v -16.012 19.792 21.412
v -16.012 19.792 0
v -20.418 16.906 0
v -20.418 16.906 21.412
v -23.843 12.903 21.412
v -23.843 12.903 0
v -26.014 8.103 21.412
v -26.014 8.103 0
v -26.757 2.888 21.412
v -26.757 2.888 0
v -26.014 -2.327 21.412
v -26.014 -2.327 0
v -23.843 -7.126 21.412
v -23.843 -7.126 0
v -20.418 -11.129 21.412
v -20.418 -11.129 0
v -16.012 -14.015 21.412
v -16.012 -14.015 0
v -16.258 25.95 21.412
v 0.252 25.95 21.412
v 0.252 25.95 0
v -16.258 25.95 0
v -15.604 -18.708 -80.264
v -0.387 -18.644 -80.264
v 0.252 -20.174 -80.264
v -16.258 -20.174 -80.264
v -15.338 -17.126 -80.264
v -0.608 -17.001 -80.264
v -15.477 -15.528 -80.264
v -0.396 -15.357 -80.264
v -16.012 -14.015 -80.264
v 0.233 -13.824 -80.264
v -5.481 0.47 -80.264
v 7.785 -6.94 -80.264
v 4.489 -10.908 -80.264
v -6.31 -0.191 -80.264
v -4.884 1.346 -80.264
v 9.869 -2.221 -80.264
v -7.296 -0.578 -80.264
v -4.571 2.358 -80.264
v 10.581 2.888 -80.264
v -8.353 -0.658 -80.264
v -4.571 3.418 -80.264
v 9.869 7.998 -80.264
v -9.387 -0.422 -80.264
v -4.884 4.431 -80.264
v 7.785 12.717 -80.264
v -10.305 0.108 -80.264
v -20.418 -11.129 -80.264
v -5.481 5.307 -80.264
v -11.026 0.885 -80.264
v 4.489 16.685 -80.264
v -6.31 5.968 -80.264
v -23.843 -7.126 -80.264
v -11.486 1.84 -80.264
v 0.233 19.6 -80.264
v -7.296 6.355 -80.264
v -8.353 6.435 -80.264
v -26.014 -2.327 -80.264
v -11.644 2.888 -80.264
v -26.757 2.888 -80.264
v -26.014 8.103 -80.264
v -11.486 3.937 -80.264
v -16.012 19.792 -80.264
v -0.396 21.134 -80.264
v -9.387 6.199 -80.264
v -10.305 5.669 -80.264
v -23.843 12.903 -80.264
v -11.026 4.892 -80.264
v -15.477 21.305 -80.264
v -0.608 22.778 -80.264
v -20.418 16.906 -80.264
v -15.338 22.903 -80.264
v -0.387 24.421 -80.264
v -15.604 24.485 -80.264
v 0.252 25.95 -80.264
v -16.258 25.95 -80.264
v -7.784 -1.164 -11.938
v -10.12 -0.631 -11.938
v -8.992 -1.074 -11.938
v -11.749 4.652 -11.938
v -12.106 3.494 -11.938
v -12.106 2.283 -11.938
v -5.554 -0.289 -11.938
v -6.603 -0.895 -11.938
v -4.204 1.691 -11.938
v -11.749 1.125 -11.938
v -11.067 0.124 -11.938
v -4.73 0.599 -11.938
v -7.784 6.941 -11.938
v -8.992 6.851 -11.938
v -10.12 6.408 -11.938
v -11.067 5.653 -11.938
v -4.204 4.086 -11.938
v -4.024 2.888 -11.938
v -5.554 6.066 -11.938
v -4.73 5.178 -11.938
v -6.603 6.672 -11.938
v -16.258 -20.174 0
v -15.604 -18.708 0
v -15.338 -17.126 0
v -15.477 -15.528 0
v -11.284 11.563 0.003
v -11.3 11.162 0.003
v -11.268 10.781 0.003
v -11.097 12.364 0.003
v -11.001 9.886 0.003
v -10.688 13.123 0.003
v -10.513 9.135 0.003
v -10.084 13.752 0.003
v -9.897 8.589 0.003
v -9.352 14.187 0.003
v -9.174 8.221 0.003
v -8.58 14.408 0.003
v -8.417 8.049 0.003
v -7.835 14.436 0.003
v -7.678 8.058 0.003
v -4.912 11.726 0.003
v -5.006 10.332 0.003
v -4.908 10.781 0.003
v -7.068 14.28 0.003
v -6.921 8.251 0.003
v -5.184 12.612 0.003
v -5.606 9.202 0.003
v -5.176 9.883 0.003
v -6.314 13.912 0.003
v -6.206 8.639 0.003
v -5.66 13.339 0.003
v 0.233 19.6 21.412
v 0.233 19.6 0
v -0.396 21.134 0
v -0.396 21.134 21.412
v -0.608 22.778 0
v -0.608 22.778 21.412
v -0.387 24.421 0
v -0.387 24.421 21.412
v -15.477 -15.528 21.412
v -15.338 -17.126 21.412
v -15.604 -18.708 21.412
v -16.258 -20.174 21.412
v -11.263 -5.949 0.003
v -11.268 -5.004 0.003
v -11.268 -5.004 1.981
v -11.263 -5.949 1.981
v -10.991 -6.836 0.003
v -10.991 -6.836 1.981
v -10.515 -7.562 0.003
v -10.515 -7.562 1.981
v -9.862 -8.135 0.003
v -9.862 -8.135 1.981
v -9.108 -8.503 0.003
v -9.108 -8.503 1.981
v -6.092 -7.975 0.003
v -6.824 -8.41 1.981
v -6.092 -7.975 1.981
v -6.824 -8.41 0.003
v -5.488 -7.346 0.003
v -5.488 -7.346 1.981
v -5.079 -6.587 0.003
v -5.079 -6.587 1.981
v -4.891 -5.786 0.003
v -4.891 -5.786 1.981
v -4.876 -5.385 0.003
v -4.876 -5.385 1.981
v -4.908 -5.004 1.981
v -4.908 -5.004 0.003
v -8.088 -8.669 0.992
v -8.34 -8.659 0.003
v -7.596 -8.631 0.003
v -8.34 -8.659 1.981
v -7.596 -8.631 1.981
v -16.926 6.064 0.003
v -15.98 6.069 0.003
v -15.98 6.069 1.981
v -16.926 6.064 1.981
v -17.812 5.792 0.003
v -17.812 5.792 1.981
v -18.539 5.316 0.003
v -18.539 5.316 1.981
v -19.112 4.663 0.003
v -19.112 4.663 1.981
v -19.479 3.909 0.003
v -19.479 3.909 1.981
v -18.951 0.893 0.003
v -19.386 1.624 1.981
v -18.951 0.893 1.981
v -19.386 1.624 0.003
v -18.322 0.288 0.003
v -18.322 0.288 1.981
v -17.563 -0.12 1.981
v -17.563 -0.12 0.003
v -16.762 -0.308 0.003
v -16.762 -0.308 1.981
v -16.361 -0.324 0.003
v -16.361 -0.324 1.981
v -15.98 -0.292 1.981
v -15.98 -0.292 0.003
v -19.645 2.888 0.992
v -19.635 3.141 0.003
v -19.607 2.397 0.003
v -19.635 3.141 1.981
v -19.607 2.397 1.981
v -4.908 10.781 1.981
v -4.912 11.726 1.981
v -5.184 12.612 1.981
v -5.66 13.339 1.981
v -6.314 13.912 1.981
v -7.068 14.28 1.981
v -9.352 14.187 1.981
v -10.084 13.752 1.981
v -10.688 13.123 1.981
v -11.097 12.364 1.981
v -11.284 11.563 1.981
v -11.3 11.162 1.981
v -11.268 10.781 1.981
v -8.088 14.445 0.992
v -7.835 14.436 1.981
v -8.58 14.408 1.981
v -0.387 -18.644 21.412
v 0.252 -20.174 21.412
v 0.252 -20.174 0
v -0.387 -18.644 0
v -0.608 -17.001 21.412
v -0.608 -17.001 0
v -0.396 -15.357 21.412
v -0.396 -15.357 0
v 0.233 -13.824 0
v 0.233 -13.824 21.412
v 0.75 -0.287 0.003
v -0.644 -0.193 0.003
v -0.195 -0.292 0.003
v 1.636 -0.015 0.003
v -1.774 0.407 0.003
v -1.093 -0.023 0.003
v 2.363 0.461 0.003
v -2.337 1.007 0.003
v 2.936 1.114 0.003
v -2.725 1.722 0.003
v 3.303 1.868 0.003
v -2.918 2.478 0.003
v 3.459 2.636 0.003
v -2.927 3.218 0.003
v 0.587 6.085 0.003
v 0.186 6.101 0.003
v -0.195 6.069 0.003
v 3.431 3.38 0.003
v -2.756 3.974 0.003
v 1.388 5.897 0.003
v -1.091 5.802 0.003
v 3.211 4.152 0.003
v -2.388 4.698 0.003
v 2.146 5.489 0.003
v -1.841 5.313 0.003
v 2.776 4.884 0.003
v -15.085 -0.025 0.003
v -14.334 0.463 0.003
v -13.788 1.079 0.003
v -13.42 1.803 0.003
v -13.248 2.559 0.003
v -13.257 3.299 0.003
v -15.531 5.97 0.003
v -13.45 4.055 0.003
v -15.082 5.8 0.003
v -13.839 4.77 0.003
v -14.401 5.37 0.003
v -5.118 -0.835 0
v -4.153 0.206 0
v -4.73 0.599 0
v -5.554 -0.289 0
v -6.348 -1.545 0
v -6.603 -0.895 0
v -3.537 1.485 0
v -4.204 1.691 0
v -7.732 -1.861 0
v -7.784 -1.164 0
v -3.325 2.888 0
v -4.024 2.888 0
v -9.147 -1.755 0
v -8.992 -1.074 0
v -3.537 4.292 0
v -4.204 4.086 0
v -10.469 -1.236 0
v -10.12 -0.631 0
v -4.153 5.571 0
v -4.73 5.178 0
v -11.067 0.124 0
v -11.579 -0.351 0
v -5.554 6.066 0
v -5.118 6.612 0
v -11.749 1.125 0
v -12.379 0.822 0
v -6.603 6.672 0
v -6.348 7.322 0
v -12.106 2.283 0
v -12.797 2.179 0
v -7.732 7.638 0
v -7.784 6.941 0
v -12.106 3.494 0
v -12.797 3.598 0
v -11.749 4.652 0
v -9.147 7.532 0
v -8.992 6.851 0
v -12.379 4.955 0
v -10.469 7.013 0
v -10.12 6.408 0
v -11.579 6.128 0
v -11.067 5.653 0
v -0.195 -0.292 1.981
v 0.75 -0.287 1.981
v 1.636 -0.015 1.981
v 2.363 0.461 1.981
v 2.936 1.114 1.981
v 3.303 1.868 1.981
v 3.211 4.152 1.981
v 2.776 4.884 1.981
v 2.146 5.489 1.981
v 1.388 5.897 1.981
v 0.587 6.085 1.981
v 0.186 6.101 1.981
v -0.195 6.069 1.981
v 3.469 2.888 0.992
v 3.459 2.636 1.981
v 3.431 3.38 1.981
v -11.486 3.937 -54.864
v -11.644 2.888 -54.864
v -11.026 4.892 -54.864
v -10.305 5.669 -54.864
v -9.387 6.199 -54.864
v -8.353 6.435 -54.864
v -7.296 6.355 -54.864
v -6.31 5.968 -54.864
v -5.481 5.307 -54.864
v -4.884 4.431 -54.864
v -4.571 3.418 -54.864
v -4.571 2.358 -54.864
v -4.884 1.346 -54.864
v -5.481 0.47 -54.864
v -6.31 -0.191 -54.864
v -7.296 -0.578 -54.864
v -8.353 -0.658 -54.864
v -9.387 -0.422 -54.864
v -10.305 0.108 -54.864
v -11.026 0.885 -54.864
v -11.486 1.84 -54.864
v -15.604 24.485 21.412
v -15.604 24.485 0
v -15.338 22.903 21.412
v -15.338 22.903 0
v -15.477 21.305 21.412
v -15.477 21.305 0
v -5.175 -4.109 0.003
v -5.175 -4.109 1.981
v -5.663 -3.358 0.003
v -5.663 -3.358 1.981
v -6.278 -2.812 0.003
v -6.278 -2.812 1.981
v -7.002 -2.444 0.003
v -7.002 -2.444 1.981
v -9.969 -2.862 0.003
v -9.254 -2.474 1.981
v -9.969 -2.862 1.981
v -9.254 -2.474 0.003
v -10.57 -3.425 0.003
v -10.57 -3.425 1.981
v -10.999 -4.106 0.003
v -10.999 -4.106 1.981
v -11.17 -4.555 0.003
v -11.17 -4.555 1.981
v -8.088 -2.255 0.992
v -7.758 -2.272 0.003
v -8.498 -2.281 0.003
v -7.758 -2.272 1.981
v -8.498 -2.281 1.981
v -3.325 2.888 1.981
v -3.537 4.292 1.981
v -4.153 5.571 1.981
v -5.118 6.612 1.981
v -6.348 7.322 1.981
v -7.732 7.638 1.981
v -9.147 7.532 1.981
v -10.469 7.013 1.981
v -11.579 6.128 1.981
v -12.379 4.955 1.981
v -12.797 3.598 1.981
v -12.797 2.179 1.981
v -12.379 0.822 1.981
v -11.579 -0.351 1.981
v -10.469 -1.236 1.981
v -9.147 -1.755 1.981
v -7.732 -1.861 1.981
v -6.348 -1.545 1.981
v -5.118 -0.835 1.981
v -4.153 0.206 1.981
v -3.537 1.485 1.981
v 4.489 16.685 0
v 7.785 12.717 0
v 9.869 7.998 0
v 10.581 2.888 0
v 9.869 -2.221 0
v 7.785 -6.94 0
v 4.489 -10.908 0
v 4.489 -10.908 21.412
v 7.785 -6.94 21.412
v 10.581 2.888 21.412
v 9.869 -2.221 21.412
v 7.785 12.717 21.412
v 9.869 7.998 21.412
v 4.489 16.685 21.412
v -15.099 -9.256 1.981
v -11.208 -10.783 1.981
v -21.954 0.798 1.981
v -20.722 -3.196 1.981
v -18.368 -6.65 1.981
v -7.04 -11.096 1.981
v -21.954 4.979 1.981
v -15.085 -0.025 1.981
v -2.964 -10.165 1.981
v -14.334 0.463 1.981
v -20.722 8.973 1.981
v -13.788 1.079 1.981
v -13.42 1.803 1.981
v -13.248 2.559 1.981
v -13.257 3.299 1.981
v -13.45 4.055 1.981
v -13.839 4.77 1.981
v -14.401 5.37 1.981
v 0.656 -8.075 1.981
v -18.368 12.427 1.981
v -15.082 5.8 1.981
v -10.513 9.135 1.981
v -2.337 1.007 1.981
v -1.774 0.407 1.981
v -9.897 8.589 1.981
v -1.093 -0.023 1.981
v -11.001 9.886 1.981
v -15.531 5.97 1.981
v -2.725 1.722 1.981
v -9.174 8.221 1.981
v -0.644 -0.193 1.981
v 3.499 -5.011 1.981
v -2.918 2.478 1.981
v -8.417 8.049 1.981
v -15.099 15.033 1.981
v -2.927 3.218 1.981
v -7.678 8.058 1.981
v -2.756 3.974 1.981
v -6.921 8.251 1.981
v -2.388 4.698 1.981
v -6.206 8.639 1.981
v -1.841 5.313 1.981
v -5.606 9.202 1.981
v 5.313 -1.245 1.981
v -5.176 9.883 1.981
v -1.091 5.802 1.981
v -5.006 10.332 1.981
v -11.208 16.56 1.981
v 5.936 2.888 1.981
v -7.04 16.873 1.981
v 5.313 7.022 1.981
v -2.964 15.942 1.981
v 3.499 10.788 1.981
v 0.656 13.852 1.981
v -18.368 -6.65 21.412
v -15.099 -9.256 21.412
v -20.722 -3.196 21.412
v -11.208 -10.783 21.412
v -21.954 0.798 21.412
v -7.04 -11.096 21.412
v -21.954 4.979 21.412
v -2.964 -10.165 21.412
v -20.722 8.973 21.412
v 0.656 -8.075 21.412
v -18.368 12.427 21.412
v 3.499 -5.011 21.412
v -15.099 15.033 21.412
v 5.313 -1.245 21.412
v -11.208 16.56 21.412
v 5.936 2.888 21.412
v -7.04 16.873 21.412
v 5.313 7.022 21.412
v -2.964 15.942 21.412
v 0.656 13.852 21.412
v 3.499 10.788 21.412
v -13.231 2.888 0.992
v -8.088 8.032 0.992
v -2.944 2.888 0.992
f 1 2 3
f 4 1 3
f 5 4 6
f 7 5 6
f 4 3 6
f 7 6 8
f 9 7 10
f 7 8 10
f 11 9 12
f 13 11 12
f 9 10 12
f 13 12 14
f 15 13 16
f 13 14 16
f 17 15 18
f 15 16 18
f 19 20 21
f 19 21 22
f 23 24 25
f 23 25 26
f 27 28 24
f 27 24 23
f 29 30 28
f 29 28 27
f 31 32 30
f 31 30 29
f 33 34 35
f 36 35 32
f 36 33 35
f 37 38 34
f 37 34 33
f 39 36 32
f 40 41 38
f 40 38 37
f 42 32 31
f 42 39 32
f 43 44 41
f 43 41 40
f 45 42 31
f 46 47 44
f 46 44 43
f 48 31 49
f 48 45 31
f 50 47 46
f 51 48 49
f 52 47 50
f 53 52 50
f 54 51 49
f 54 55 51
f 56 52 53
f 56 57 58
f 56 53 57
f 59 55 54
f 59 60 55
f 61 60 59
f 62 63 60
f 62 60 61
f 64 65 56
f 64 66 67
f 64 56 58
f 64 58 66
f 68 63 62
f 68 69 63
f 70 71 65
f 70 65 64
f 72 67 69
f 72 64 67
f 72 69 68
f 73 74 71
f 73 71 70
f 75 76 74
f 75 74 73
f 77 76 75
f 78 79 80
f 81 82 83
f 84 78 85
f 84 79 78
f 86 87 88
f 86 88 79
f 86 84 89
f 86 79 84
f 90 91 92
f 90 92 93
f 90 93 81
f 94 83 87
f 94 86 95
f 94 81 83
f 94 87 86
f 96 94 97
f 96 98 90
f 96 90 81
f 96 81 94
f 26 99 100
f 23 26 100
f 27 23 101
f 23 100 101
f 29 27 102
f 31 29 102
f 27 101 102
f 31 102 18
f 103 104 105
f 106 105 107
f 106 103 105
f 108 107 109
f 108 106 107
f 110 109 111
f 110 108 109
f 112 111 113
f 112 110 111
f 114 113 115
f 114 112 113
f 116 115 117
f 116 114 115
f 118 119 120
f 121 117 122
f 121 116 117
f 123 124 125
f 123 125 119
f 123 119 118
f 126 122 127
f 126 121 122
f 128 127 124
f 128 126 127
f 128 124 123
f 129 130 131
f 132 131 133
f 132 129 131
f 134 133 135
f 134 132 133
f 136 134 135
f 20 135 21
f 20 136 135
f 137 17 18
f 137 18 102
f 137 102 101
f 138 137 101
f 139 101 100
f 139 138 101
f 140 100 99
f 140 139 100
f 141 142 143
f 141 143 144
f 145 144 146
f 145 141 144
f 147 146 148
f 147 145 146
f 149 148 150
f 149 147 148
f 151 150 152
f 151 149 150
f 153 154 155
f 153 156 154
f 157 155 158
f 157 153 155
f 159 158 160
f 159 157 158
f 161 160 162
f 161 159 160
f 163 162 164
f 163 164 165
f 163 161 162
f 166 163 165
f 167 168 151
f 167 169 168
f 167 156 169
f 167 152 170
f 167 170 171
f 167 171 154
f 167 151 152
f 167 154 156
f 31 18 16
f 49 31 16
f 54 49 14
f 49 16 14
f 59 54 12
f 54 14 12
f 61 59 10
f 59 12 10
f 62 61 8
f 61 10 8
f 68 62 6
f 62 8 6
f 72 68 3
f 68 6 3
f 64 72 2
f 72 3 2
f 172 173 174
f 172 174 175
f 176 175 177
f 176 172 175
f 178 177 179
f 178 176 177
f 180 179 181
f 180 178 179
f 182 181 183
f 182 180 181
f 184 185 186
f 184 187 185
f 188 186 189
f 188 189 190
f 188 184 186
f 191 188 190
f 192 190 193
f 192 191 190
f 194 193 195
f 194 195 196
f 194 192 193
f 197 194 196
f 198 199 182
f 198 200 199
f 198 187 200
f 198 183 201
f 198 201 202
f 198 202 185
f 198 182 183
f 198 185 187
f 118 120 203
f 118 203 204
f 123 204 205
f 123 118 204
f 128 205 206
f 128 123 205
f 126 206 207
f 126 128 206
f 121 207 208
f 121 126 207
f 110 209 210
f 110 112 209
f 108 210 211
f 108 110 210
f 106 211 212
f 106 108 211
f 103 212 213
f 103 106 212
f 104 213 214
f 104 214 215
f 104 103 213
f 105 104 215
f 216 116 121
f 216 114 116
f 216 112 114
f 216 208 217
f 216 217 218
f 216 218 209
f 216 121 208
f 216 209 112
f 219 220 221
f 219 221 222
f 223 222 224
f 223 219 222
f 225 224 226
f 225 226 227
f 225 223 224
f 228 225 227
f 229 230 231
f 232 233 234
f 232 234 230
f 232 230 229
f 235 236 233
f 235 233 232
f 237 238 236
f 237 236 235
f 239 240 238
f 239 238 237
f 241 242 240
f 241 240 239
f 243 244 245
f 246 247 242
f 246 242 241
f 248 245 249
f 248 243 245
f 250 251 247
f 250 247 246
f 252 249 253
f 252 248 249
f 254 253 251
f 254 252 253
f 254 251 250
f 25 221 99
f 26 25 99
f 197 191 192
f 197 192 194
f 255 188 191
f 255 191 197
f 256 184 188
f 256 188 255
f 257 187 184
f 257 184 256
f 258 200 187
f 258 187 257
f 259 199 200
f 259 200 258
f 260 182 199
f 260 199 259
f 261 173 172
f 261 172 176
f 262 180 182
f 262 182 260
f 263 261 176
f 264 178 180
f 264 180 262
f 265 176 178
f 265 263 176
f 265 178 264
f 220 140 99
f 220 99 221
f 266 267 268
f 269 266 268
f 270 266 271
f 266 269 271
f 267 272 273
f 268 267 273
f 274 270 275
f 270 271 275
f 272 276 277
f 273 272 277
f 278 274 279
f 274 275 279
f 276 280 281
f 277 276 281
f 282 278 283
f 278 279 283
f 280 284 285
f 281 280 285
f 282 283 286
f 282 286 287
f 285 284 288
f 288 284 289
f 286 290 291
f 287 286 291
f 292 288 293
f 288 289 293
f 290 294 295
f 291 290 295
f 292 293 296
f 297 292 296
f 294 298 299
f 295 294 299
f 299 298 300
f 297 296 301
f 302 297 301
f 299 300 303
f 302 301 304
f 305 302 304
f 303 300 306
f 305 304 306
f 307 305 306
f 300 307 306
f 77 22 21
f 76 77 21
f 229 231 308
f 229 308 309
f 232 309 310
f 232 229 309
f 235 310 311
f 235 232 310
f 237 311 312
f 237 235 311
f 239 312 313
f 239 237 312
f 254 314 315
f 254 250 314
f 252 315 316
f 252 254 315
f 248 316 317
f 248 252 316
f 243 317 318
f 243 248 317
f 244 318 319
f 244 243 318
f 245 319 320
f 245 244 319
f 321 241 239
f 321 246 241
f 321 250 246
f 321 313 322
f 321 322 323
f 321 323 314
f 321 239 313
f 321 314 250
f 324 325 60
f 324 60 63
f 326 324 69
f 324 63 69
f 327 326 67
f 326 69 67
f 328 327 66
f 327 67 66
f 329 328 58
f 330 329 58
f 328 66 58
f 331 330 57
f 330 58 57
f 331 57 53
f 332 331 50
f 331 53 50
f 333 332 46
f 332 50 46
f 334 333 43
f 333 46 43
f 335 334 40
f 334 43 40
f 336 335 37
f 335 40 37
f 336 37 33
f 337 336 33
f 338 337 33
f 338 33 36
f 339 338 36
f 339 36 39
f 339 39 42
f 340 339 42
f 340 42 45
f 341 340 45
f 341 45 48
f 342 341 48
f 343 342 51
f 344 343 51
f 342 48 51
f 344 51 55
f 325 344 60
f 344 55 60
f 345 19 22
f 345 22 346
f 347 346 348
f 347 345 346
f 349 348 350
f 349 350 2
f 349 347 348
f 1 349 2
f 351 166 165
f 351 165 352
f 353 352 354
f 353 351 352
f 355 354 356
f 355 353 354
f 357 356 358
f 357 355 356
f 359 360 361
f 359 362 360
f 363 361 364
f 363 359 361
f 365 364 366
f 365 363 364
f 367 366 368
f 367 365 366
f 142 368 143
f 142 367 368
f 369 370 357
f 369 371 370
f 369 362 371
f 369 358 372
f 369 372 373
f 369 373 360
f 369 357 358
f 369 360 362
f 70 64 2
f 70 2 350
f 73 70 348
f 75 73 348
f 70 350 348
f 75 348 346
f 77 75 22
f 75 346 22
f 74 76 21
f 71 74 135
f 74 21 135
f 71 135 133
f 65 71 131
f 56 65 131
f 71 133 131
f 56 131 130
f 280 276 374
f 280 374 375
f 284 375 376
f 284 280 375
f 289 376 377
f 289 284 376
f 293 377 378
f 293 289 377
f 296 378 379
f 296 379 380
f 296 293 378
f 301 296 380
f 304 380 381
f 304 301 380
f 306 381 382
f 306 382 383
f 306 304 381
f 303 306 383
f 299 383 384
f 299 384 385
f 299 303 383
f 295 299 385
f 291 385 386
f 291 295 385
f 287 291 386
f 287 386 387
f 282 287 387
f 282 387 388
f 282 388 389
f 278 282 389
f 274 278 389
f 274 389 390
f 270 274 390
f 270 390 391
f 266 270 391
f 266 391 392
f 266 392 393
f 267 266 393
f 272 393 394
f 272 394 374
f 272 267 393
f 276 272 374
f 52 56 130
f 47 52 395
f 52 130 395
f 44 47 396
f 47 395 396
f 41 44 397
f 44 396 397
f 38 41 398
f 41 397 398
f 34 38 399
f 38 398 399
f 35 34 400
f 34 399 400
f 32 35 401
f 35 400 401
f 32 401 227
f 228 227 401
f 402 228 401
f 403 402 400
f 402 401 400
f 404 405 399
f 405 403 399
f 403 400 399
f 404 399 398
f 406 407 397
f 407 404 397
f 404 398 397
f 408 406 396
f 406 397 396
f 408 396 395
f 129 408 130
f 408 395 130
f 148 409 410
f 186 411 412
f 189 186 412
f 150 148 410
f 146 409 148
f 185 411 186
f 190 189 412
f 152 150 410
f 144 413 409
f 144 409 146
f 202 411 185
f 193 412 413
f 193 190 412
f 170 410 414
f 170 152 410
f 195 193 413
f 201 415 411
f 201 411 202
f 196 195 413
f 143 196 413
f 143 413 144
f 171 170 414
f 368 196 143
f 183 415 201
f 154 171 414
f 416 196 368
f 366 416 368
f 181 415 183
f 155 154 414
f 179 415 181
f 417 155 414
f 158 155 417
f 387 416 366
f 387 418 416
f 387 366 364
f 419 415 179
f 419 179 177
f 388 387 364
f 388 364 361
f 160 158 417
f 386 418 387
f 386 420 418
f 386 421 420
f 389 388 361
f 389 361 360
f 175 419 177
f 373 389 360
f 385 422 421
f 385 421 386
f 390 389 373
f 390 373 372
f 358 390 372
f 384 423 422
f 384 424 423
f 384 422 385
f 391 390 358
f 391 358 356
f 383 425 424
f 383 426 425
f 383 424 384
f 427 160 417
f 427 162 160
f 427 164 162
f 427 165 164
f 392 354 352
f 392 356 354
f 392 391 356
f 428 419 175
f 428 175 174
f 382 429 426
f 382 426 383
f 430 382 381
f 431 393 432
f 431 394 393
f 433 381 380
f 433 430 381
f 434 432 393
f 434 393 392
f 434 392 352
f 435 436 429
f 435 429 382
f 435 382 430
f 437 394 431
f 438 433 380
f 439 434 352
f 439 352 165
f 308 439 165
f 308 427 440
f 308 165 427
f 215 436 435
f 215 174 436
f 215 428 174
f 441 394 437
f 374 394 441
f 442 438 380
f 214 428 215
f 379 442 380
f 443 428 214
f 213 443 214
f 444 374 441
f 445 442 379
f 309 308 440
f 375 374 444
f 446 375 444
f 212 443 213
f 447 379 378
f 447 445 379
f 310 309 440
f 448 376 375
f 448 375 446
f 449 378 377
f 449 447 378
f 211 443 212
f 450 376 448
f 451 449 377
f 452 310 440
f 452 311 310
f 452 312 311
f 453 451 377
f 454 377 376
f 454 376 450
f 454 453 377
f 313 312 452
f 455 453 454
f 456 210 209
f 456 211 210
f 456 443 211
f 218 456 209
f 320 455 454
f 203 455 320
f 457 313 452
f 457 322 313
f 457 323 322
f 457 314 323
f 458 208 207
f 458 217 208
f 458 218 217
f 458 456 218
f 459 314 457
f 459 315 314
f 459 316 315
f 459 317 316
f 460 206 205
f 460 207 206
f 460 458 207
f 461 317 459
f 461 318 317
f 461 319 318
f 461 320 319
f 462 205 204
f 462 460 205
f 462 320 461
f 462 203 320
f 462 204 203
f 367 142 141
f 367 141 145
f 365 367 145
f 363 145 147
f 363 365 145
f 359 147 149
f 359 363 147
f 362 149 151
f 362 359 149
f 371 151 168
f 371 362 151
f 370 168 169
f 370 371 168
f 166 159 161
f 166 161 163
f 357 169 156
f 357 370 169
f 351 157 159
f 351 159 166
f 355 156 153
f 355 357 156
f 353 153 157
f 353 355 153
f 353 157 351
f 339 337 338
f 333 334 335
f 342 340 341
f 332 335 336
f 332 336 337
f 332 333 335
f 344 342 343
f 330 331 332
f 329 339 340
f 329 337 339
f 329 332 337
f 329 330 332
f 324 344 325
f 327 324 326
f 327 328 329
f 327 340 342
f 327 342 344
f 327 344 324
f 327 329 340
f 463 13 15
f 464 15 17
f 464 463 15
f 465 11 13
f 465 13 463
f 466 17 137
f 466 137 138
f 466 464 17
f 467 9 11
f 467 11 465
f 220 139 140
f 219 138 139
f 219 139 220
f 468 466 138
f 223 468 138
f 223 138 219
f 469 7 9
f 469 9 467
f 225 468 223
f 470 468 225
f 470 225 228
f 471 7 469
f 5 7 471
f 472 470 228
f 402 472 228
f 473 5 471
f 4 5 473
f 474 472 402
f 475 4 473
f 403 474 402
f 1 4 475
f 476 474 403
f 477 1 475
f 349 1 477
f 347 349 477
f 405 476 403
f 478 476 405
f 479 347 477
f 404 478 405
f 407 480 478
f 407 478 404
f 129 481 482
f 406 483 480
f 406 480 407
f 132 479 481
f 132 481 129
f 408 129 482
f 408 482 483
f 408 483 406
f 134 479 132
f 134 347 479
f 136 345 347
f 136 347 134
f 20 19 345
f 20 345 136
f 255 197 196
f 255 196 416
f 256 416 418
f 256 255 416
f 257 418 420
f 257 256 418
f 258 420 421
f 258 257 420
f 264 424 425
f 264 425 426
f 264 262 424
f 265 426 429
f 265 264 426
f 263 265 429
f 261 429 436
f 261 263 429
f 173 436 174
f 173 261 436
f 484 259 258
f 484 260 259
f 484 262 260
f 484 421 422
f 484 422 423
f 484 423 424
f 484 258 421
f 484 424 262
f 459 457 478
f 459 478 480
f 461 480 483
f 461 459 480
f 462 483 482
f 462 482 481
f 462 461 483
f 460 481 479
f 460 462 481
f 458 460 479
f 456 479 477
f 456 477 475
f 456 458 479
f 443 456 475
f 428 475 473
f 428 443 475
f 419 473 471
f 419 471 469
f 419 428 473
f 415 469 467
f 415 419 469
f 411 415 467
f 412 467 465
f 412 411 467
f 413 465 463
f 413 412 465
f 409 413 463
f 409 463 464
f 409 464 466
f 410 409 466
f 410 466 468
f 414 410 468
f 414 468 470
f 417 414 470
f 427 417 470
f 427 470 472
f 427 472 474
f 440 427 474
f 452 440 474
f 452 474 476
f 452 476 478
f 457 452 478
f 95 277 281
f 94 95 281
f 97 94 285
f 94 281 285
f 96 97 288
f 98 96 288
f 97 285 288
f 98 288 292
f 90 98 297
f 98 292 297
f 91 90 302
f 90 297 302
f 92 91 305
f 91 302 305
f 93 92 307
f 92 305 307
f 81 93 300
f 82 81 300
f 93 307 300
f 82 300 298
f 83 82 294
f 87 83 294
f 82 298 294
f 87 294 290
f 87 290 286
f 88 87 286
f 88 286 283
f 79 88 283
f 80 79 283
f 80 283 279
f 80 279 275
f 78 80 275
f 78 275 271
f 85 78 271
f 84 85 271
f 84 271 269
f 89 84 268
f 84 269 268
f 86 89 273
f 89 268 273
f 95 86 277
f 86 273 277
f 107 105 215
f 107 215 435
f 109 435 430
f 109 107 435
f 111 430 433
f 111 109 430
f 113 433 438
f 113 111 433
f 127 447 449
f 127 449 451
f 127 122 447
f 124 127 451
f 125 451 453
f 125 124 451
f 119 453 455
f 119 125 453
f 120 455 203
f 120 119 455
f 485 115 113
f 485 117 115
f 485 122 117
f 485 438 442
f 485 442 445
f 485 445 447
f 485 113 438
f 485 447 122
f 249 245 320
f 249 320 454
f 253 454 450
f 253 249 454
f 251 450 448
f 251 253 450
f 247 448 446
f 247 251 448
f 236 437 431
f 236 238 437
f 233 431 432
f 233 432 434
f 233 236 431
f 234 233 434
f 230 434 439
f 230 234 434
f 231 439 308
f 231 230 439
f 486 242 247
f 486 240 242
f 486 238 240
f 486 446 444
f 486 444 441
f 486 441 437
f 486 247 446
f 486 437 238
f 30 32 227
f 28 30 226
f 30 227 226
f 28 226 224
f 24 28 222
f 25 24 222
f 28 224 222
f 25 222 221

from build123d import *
from build123d.topology import SkipClean

# Parameters (mm, degrees)
BOSS_EXTRUDE1_DEPTH   = 0.00254
BOSS_EXTRUDE1_2_DEPTH = 0.00254
BOSS_EXTRUDE1_3_DEPTH = 0.00254
BOSS_EXTRUDE1_4_DEPTH = 0.00254
SKETCH1_3_R           = 4.7625
BOSS_EXTRUDE2_DEPTH   = 1.9812
SKETCH1_6_R           = 14.02334
BOSS_EXTRUDE4_DEPTH   = 1.9812
SKETCH1_7_R           = 18.669
SKETCH1_7_R_2         = 14.02334
BOSS_EXTRUDE5_DEPTH   = 21.4122
BOSS_EXTRUDE6_DEPTH   = 21.4122
BOSS_EXTRUDE7_DEPTH   = 80.264
SKETCH9_R             = 4.064
CUT_EXTRUDE6_DEPTH    = 11.938
SKETCH10_R            = 3.556
CUT_EXTRUDE7_DEPTH    = 25.4


with BuildPart() as part:
    # Sketch1 → Boss-Extrude1 (new body)
    with BuildSketch(Plane.XY):
        with BuildLine():
            add(Edge.make_bspline(
                [(-11.267882352, 10.780839024), (-10.870534927, 8.031966006), (-8.087704817, 8.031966006), (-5.304874707, 8.031966006), (-4.907527282, 10.780839024)],
                knots=[3.284867705, 3.284867705, 3.284867705, 4.71238898, 4.71238898, 6.139910255, 6.139910255, 6.139910255], degree=2, weights=[1, 0.755905209, 1, 0.755905209, 1]))
            add(Edge.make_bspline(
                [(-4.907527282, 10.780839024), (-4.377808345, 14.445466006), (-8.087704817, 14.445466006), (-11.79760129, 14.445466006), (-11.267882352, 10.780839024)],
                knots=[6.139910255, 6.139910255, 6.139910255, 7.853981634, 7.853981634, 9.568053013, 9.568053013, 9.568053013], degree=2, weights=[1, 0.654681079, 1, 0.654681079, 1]))
        make_face()
    extrude(amount=BOSS_EXTRUDE1_DEPTH)



with BuildPart() as body_2:
    # Sketch1 → Boss-Extrude1 2 (new body)
    with BuildSketch(Plane.XY):
        with BuildLine():
            add(Edge.make_bspline(
                [(-15.980077835, -0.291711529), (-13.231204817, 0.105635896), (-13.231204817, 2.888466006), (-13.231204817, 5.671296116), (-15.980077835, 6.068643541)],
                knots=[3.284867705, 3.284867705, 3.284867705, 4.71238898, 4.71238898, 6.139910255, 6.139910255, 6.139910255], degree=2, weights=[1, 0.755905209, 1, 0.755905209, 1]))
            add(Edge.make_bspline(
                [(-15.980077835, 6.068643541), (-19.644704817, 6.598362479), (-19.644704817, 2.888466006), (-19.644704817, -0.821430466), (-15.980077835, -0.291711529)],
                knots=[6.139910255, 6.139910255, 6.139910255, 7.853981634, 7.853981634, 9.568053013, 9.568053013, 9.568053013], degree=2, weights=[1, 0.654681079, 1, 0.654681079, 1]))
        make_face()
    extrude(amount=BOSS_EXTRUDE1_2_DEPTH)


with BuildPart() as body_3:
    # Sketch1 → Boss-Extrude1 3 (new body)
    with BuildSketch(Plane.XY):
        with BuildLine():
            add(Edge.make_bspline(
                [(-4.907527282, -5.003907011), (-5.304874707, -2.255033994), (-8.087704817, -2.255033994), (-10.870534927, -2.255033994), (-11.267882352, -5.003907011)],
                knots=[3.284867705, 3.284867705, 3.284867705, 4.71238898, 4.71238898, 6.139910255, 6.139910255, 6.139910255], degree=2, weights=[1, 0.755905209, 1, 0.755905209, 1]))
            add(Edge.make_bspline(
                [(-11.267882352, -5.003907011), (-11.79760129, -8.668533994), (-8.087704817, -8.668533994), (-4.377808345, -8.668533994), (-4.907527282, -5.003907011)],
                knots=[6.139910255, 6.139910255, 6.139910255, 7.853981634, 7.853981634, 9.568053013, 9.568053013, 9.568053013], degree=2, weights=[1, 0.654681079, 1, 0.654681079, 1]))
        make_face()
    extrude(amount=BOSS_EXTRUDE1_3_DEPTH)


with BuildPart() as body_4:
    # Sketch1 → Boss-Extrude1 4 (new body)
    with BuildSketch(Plane.XY):
        with BuildLine():
            add(Edge.make_bspline(
                [(-0.1953318, 6.068643541), (-2.944204817, 5.671296116), (-2.944204817, 2.888466006), (-2.944204817, 0.105635896), (-0.1953318, -0.291711529)],
                knots=[3.284867705, 3.284867705, 3.284867705, 4.71238898, 4.71238898, 6.139910255, 6.139910255, 6.139910255], degree=2, weights=[1, 0.755905209, 1, 0.755905209, 1]))
            add(Edge.make_bspline(
                [(-0.1953318, -0.291711529), (3.469295183, -0.821430466), (3.469295183, 2.888466006), (3.469295183, 6.598362479), (-0.1953318, 6.068643541)],
                knots=[6.139910255, 6.139910255, 6.139910255, 7.853981634, 7.853981634, 9.568053013, 9.568053013, 9.568053013], degree=2, weights=[1, 0.654681079, 1, 0.654681079, 1]))
        make_face()
    extrude(amount=BOSS_EXTRUDE1_4_DEPTH)


with BuildPart() as part_1:
    add(part.part)

    add(body_2.part)  # Boss-Extrude2 merges body 2

    add(body_3.part)  # Boss-Extrude2 merges body 3

    add(body_4.part)  # Boss-Extrude2 merges body 4
    # Sketch1<3> → Boss-Extrude2 (add)
    with BuildSketch(Plane.XY):
        with BuildLine():
            ThreePointArc((-0.1953318, 6.068643541), (-2.070933216, 8.905237607), (-4.907527282, 10.780839024))
            add(Edge.make_bspline(
                [(-11.267882352, 10.780839024), (-10.870534927, 8.031966006), (-8.087704817, 8.031966006), (-5.304874707, 8.031966006), (-4.907527282, 10.780839024)],
                knots=[3.284867705, 3.284867705, 3.284867705, 4.71238898, 4.71238898, 6.139910255, 6.139910255, 6.139910255], degree=2, weights=[1, 0.755905209, 1, 0.755905209, 1]))
            ThreePointArc((-11.267882352, 10.780839024), (-14.104476418, 8.905237607), (-15.980077835, 6.068643541))
            add(Edge.make_bspline(
                [(-15.980077835, -0.291711529), (-13.231204817, 0.105635896), (-13.231204817, 2.888466006), (-13.231204817, 5.671296116), (-15.980077835, 6.068643541)],
                knots=[3.284867705, 3.284867705, 3.284867705, 4.71238898, 4.71238898, 6.139910255, 6.139910255, 6.139910255], degree=2, weights=[1, 0.755905209, 1, 0.755905209, 1]))
            ThreePointArc((-15.980077835, -0.291711529), (-14.104476418, -3.128305595), (-11.267882352, -5.003907011))
            add(Edge.make_bspline(
                [(-4.907527282, -5.003907011), (-5.304874707, -2.255033994), (-8.087704817, -2.255033994), (-10.870534927, -2.255033994), (-11.267882352, -5.003907011)],
                knots=[3.284867705, 3.284867705, 3.284867705, 4.71238898, 4.71238898, 6.139910255, 6.139910255, 6.139910255], degree=2, weights=[1, 0.755905209, 1, 0.755905209, 1]))
            ThreePointArc((-4.907527282, -5.003907011), (-2.070933216, -3.128305595), (-0.1953318, -0.291711529))
            add(Edge.make_bspline(
                [(-0.1953318, 6.068643541), (-2.944204817, 5.671296116), (-2.944204817, 2.888466006), (-2.944204817, 0.105635896), (-0.1953318, -0.291711529)],
                knots=[3.284867705, 3.284867705, 3.284867705, 4.71238898, 4.71238898, 6.139910255, 6.139910255, 6.139910255], degree=2, weights=[1, 0.755905209, 1, 0.755905209, 1]))
        make_face()
        with Locations((-8.087704817, 2.888466006)):
            Circle(SKETCH1_3_R, mode=Mode.SUBTRACT)
    extrude(amount=BOSS_EXTRUDE2_DEPTH)

    # Sketch1<6> → Boss-Extrude4 (add)
    with BuildSketch(Plane.XY):
        with Locations((-8.087704817, 2.888466006)):
            Circle(SKETCH1_6_R)
        with BuildLine():
            add(Edge.make_bspline(
                [(-15.980077835, 6.068643541), (-19.644704817, 6.598362479), (-19.644704817, 2.888466006), (-19.644704817, -0.821430466), (-15.980077835, -0.291711529)],
                knots=[6.139910255, 6.139910255, 6.139910255, 7.853981634, 7.853981634, 9.568053013, 9.568053013, 9.568053013], degree=2, weights=[1, 0.654681079, 1, 0.654681079, 1]))
            ThreePointArc((-15.980077835, -0.291711529), (-14.104476418, -3.128305595), (-11.267882352, -5.003907011))
            add(Edge.make_bspline(
                [(-11.267882352, -5.003907011), (-11.79760129, -8.668533994), (-8.087704817, -8.668533994), (-4.377808345, -8.668533994), (-4.907527282, -5.003907011)],
                knots=[6.139910255, 6.139910255, 6.139910255, 7.853981634, 7.853981634, 9.568053013, 9.568053013, 9.568053013], degree=2, weights=[1, 0.654681079, 1, 0.654681079, 1]))
            ThreePointArc((-4.907527282, -5.003907011), (-2.070933216, -3.128305595), (-0.1953318, -0.291711529))
            add(Edge.make_bspline(
                [(-0.1953318, -0.291711529), (3.469295183, -0.821430466), (3.469295183, 2.888466006), (3.469295183, 6.598362479), (-0.1953318, 6.068643541)],
                knots=[6.139910255, 6.139910255, 6.139910255, 7.853981634, 7.853981634, 9.568053013, 9.568053013, 9.568053013], degree=2, weights=[1, 0.654681079, 1, 0.654681079, 1]))
            ThreePointArc((-0.1953318, 6.068643541), (-2.070933216, 8.905237607), (-4.907527282, 10.780839024))
            add(Edge.make_bspline(
                [(-4.907527282, 10.780839024), (-4.377808345, 14.445466006), (-8.087704817, 14.445466006), (-11.79760129, 14.445466006), (-11.267882352, 10.780839024)],
                knots=[6.139910255, 6.139910255, 6.139910255, 7.853981634, 7.853981634, 9.568053013, 9.568053013, 9.568053013], degree=2, weights=[1, 0.654681079, 1, 0.654681079, 1]))
            ThreePointArc((-11.267882352, 10.780839024), (-14.104476418, 8.905237607), (-15.980077835, 6.068643541))
        make_face(mode=Mode.SUBTRACT)
    extrude(amount=BOSS_EXTRUDE4_DEPTH)

    # Sketch1<7> → Boss-Extrude5 (add)
    with BuildSketch(Plane.XY):
        with Locations((-8.087704817, 2.888466006)):
            Circle(SKETCH1_7_R)
        with Locations((-8.087704817, 2.888466006)):
            Circle(SKETCH1_7_R_2, mode=Mode.SUBTRACT)
    extrude(amount=BOSS_EXTRUDE5_DEPTH)

    # Sketch2 → Boss-Extrude6 (add, through all)
    with BuildSketch(Plane.XY.offset(21.4122)):
        with BuildLine():
            ThreePointArc((-16.011919536, 19.792263866), (-7.867306443, 21.556164995), (0.233391542, 19.60046518))
            ThreePointArc((0.233391542, 19.60046518), (-0.607958843, 22.777981932), (0.25217674, 25.95046518))
            Line((0.25217674, 25.95046518), (-16.25782326, 25.95046518))
            ThreePointArc((-16.25782326, 25.95046518), (-15.337670431, 22.903197631), (-16.011919536, 19.792263866))
        make_face()
        with BuildLine():
            ThreePointArc((0.233391542, -13.823533167), (-7.867306443, -15.779232983), (-16.011919536, -14.015331854))
            ThreePointArc((-16.011919536, -14.015331854), (-15.337670431, -17.126265618), (-16.25782326, -20.173533167))
            Line((-16.25782326, -20.173533167), (0.25217674, -20.173533167))
            ThreePointArc((0.25217674, -20.173533167), (-0.607958843, -17.001049919), (0.233391542, -13.823533167))
        make_face()
    extrude(amount=-BOSS_EXTRUDE6_DEPTH)

    # Sketch3 → Boss-Extrude7 (add)
    with SkipClean():  # the faces are left unmerged after this step: merging them gives an invalid solid
        with BuildSketch(Plane(origin=(0, 0, 0), x_dir=(-1, 0, 0), z_dir=(0, 0, -1))):
            with BuildLine():
                ThreePointArc((16.011919536, 19.792263866), (15.337670431, 22.903197631), (16.25782326, 25.95046518))
                Line((16.25782326, 25.95046518), (-0.25217674, 25.95046518))
                ThreePointArc((-0.25217674, 25.95046518), (0.607958843, 22.777981932), (-0.233391542, 19.60046518))
                ThreePointArc((-0.233391542, 19.60046518), (-10.581295183, 2.888466006), (-0.233391542, -13.823533167))
                ThreePointArc((-0.233391542, -13.823533167), (0.607958843, -17.001049919), (-0.25217674, -20.173533167))
                Line((-0.25217674, -20.173533167), (16.25782326, -20.173533167))
                ThreePointArc((16.25782326, -20.173533167), (15.337670431, -17.126265618), (16.011919536, -14.015331854))
                ThreePointArc((16.011919536, -14.015331854), (26.756704817, 2.888466006), (16.011919536, 19.792263866))
            make_face()
        extrude(amount=BOSS_EXTRUDE7_DEPTH)

    # Sketch9 → Cut-Extrude6 (cut)
    with SkipClean():  # the faces are left unmerged after this step: merging them gives an invalid solid
        with BuildSketch(Plane.XY):
            with Locations((-8.087704817, 2.888466006)):
                Circle(SKETCH9_R)
        extrude(amount=-CUT_EXTRUDE6_DEPTH, mode=Mode.SUBTRACT)

    # Sketch10 → Cut-Extrude7 (cut)
    with SkipClean():  # the faces are left unmerged after this step: merging them gives an invalid solid
        with BuildSketch(Plane(origin=(0, 0, -80.264), x_dir=(-1, 0, 0), z_dir=(0, 0, -1))):
            with Locations((8.087704817, 2.888466006)):
                Circle(SKETCH10_R)
        extrude(amount=-CUT_EXTRUDE7_DEPTH, mode=Mode.SUBTRACT)


solid = part_1.part
